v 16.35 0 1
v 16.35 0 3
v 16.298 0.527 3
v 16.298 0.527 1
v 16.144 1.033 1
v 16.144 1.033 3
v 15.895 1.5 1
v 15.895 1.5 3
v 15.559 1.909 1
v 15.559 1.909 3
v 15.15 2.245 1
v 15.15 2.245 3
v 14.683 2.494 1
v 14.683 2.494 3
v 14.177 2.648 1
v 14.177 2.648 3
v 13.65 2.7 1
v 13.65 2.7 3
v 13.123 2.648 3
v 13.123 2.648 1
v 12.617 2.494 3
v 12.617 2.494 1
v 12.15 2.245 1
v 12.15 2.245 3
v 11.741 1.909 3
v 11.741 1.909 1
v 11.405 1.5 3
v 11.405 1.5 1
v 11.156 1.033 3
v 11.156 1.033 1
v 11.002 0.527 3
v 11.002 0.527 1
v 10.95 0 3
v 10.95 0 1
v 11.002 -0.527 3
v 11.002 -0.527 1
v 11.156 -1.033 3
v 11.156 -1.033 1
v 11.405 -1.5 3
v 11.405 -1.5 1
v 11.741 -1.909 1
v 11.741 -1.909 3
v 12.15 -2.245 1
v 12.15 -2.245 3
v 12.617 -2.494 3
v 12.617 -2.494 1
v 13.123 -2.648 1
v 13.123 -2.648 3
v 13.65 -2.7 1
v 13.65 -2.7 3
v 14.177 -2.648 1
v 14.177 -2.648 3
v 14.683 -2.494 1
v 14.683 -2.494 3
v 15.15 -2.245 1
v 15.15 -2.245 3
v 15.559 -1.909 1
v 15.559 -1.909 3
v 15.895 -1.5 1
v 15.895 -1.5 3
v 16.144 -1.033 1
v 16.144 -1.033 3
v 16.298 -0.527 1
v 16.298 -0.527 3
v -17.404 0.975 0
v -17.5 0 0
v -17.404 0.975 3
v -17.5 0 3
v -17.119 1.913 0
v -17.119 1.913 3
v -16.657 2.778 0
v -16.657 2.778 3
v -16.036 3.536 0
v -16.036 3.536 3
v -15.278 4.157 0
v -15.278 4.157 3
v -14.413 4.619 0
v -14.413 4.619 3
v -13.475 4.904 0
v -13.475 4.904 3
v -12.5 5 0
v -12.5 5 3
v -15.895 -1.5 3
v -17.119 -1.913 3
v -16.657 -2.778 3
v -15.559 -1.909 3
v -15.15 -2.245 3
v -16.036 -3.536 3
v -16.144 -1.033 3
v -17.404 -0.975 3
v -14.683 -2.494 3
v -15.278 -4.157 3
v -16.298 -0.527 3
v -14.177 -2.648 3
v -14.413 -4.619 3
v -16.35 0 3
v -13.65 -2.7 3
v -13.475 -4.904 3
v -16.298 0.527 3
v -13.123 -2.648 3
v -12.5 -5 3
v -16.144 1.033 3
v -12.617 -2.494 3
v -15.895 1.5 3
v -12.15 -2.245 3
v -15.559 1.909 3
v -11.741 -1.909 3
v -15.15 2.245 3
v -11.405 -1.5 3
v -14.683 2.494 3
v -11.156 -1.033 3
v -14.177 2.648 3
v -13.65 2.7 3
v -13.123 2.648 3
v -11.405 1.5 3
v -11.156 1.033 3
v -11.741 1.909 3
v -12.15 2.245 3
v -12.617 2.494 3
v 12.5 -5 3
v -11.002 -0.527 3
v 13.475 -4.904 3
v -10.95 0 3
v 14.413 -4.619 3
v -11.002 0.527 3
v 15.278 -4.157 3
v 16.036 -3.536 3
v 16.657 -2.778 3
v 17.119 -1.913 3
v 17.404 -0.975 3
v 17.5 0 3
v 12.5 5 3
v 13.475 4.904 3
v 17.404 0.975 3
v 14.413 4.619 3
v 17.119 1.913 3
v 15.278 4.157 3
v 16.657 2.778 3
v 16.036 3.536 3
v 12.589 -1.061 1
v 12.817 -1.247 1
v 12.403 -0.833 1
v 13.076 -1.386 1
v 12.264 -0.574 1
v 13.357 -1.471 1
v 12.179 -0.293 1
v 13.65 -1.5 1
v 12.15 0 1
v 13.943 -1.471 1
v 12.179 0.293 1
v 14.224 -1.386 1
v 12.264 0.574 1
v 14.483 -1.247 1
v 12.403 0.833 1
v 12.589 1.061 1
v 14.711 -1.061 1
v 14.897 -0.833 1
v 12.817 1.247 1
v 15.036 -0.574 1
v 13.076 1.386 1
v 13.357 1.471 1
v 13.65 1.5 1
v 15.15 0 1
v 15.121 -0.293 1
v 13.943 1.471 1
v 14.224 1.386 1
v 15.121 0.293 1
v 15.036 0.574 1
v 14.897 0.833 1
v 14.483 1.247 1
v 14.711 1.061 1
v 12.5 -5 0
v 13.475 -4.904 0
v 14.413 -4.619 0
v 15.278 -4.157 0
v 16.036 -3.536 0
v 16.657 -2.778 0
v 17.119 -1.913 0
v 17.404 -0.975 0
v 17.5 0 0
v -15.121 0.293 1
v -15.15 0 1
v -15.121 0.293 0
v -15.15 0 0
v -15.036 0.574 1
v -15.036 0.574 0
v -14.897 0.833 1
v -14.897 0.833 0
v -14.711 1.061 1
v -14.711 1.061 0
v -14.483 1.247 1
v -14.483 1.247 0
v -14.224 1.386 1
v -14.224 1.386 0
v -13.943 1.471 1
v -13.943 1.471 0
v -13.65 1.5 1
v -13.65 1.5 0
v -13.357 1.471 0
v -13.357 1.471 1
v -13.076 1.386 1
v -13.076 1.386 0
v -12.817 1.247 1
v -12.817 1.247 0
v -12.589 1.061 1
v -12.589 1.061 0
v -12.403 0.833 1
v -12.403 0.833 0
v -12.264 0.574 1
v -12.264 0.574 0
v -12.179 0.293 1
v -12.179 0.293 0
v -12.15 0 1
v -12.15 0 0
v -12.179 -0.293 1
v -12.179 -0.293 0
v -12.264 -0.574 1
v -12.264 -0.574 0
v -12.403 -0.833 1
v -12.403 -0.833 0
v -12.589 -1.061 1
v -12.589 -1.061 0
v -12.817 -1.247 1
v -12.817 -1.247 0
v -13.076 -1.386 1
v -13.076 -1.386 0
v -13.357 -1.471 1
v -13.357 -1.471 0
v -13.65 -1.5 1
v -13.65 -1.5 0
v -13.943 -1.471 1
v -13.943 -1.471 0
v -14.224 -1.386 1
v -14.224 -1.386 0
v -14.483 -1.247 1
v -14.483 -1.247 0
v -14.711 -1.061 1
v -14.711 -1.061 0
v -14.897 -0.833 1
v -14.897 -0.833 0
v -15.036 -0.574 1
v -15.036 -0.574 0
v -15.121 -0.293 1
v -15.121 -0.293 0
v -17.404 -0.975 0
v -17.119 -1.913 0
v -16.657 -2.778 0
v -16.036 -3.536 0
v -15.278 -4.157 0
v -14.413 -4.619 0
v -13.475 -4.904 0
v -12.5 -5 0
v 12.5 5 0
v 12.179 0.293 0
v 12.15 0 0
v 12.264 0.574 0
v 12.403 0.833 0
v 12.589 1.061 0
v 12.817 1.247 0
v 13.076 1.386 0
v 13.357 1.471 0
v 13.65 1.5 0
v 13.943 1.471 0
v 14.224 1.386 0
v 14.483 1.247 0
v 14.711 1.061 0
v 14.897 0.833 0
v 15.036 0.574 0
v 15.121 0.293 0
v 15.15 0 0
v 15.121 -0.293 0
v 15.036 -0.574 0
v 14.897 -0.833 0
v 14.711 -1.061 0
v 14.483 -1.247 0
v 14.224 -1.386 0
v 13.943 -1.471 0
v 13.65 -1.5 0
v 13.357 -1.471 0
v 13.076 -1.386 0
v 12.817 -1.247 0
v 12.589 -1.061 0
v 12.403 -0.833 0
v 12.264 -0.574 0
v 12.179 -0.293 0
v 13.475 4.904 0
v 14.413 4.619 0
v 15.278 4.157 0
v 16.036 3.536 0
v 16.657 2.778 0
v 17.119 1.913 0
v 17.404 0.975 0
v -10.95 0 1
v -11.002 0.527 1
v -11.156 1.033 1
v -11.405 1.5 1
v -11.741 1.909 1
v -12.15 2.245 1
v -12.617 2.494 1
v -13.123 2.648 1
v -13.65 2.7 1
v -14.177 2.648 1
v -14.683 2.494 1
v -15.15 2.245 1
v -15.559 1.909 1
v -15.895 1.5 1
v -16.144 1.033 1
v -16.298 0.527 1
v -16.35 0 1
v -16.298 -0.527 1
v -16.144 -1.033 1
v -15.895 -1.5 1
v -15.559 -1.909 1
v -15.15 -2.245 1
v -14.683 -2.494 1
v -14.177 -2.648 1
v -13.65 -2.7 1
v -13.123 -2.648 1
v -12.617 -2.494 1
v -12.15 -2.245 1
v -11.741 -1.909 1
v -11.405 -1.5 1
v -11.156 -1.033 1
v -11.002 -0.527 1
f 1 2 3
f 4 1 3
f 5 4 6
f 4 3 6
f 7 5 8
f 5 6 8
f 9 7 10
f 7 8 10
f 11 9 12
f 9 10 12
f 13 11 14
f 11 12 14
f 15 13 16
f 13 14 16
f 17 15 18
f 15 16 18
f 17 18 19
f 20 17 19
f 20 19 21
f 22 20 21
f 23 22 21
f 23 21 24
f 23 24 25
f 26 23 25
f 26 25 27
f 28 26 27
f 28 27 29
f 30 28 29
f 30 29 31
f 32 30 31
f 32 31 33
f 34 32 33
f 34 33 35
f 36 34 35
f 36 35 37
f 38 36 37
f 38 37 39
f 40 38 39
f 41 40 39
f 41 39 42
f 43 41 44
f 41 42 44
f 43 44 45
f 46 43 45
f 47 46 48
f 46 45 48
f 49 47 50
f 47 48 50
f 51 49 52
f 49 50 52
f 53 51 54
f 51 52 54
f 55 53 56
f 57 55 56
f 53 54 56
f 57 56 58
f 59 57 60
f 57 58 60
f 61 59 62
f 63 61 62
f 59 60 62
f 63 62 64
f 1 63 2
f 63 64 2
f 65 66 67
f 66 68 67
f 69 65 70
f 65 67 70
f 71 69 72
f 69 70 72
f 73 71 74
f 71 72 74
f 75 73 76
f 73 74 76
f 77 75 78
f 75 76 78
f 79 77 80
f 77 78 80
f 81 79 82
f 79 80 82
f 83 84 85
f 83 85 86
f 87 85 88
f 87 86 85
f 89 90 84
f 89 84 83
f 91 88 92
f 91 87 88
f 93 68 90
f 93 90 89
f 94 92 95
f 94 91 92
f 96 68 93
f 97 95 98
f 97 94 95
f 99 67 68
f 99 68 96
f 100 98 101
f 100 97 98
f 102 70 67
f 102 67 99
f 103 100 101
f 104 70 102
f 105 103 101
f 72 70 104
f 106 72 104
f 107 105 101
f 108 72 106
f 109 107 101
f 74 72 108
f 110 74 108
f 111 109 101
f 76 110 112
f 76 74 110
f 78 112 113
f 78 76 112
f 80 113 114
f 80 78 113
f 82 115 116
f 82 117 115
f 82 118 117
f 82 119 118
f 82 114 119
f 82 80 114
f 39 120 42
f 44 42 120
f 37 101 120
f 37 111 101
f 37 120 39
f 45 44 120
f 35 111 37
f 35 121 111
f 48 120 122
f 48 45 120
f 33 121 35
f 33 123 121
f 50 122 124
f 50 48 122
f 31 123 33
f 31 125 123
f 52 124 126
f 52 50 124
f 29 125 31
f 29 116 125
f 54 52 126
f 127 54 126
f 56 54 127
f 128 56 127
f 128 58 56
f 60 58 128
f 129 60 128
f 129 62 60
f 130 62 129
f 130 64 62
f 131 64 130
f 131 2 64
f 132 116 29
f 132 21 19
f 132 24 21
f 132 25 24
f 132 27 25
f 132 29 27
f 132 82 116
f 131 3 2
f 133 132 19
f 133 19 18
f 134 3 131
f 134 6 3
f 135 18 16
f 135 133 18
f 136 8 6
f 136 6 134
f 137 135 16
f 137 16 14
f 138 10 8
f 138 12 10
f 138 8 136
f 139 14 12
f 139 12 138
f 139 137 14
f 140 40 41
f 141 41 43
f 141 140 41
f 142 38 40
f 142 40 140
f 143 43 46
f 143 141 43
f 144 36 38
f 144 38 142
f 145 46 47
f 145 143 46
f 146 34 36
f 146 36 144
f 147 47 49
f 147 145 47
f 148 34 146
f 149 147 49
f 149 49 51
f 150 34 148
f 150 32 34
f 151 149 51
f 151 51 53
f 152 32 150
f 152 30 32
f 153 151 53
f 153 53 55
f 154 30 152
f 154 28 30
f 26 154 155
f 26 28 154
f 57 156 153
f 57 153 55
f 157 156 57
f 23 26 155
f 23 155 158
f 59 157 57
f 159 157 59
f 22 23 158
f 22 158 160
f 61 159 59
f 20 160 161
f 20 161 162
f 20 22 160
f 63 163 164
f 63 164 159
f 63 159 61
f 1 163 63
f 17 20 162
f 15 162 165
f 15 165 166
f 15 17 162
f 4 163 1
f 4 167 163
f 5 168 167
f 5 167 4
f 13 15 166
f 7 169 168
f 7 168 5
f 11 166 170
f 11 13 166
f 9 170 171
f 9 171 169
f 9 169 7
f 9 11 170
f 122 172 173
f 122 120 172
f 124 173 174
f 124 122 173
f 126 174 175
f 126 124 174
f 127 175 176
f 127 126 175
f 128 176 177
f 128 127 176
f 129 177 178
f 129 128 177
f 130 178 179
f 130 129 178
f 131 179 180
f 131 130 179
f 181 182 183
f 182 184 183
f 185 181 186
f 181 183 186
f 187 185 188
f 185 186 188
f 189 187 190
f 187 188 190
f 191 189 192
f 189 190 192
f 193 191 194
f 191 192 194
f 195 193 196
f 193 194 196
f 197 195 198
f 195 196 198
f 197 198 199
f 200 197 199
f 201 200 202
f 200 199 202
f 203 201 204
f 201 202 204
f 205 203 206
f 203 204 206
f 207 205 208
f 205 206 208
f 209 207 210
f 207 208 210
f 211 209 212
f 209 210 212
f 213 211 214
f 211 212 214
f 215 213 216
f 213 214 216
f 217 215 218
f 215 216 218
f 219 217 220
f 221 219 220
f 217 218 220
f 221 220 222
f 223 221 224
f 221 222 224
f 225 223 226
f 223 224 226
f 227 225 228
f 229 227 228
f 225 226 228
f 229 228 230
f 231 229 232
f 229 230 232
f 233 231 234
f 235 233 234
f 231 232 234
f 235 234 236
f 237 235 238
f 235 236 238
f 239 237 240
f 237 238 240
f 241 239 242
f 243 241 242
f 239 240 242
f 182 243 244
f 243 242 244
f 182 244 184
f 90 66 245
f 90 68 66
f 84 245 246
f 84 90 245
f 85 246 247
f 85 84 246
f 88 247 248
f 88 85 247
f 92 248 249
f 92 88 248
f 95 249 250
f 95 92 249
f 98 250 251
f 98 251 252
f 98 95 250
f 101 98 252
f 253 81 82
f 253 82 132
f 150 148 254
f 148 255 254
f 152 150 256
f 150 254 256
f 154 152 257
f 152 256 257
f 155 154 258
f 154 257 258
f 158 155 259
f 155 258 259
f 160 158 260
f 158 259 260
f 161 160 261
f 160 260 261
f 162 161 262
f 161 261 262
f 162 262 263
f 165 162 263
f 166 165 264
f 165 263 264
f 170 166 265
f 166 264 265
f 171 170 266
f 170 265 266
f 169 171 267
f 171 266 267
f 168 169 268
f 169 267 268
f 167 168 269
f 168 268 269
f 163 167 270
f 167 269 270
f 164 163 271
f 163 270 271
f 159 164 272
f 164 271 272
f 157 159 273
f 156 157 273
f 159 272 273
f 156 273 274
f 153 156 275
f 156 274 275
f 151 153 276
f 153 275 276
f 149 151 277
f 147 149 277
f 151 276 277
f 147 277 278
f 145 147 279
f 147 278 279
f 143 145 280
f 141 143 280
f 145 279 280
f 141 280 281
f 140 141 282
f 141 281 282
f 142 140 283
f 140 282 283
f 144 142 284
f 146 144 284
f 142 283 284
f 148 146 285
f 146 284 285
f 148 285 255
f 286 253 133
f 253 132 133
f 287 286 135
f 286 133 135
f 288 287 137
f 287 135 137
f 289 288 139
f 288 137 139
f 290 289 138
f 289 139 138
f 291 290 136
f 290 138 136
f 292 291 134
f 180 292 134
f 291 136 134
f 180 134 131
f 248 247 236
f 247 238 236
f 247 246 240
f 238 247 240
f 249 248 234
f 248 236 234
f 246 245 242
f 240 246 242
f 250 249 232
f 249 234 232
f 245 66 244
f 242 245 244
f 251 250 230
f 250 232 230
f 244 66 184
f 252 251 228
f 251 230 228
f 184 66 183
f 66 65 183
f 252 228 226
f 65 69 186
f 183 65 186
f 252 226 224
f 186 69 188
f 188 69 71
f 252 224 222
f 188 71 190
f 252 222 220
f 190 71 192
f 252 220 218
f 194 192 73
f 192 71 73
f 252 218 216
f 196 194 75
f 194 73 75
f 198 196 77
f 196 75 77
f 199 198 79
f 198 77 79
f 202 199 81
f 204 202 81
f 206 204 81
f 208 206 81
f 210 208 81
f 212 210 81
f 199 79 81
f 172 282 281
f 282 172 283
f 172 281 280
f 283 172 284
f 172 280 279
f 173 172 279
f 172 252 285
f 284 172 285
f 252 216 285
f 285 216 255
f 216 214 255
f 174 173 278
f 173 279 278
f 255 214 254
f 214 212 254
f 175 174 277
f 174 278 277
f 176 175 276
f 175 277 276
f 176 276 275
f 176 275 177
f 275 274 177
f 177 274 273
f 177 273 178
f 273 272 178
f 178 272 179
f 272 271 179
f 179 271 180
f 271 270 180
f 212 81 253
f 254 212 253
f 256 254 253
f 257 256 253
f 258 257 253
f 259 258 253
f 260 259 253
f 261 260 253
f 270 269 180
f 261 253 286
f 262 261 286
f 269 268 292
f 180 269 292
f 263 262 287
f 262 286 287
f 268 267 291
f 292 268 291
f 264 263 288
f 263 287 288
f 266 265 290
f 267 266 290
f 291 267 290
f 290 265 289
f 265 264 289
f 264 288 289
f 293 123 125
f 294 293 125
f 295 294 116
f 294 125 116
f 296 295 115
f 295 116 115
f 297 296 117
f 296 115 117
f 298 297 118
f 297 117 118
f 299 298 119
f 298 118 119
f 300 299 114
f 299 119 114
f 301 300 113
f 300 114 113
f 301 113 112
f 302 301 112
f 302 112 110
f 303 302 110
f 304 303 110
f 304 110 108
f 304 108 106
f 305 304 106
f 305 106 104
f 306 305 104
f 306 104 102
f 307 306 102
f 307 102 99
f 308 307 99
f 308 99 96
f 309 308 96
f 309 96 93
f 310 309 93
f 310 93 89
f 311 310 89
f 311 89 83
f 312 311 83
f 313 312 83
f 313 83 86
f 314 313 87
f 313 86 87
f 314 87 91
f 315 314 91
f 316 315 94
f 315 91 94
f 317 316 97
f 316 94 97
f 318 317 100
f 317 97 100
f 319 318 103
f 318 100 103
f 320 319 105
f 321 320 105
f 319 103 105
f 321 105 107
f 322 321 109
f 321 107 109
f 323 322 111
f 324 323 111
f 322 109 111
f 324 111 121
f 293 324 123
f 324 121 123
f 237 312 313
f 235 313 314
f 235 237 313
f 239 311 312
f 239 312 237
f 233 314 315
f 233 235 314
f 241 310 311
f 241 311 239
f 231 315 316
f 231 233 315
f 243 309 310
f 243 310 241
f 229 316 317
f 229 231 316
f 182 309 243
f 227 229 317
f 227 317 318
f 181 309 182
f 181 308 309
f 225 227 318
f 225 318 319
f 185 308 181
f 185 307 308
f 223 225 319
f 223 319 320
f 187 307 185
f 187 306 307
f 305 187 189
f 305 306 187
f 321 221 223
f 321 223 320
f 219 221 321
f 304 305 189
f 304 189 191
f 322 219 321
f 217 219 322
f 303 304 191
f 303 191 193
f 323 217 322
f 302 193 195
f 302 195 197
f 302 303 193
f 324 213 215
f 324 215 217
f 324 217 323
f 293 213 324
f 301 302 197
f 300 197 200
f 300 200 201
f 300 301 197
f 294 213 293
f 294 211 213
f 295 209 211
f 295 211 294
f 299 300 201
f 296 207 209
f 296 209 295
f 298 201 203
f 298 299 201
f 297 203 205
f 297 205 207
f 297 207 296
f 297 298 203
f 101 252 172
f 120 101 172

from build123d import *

# Parameters (mm, degrees)
F0_W           = 35
F0_H           = 10
F0_W_2         = 20
F0_H_2         = 5
F1_DEPTH       = 3
F4_D           = 3
F4_CBORE_D     = 5.4
F4_CBORE_DEPTH = 2
F5_R           = 4.99999


# Not quite as in the source:
# - a fillet or chamfer is up to 0.001 mm smaller than in the source, because OpenCascade refuses the exact size


with BuildPart() as f1:
    # F0 (on Top) → F1 (new body)
    with BuildSketch(Plane.XY):
        Rectangle(F0_W, F0_H)
        Rectangle(F0_W_2, F0_H_2, mode=Mode.SUBTRACT)
        Rectangle(F0_W_2, F0_H_2)
    extrude(amount=F1_DEPTH)

    # F4 (through all)
    with Locations(Plane.XY.offset(3)):
        with Locations((-13.65, 0), (13.65, 0)):
            CounterBoreHole(F4_D / 2, F4_CBORE_D / 2, F4_CBORE_DEPTH)

    # F5 (radius 5 in the source; OpenCascade refuses exactly that, so slightly less here)
    f5_edges = [f1.edges().sort_by_distance(p)[0] for p in [
        (-17.5, -5, 1.5),
        (-17.5, 5, 1.5),
        (17.5, 5, 1.5),
        (17.5, -5, 1.5),
    ]]
    fillet(f5_edges, radius=F5_R)


solid = f1.part
